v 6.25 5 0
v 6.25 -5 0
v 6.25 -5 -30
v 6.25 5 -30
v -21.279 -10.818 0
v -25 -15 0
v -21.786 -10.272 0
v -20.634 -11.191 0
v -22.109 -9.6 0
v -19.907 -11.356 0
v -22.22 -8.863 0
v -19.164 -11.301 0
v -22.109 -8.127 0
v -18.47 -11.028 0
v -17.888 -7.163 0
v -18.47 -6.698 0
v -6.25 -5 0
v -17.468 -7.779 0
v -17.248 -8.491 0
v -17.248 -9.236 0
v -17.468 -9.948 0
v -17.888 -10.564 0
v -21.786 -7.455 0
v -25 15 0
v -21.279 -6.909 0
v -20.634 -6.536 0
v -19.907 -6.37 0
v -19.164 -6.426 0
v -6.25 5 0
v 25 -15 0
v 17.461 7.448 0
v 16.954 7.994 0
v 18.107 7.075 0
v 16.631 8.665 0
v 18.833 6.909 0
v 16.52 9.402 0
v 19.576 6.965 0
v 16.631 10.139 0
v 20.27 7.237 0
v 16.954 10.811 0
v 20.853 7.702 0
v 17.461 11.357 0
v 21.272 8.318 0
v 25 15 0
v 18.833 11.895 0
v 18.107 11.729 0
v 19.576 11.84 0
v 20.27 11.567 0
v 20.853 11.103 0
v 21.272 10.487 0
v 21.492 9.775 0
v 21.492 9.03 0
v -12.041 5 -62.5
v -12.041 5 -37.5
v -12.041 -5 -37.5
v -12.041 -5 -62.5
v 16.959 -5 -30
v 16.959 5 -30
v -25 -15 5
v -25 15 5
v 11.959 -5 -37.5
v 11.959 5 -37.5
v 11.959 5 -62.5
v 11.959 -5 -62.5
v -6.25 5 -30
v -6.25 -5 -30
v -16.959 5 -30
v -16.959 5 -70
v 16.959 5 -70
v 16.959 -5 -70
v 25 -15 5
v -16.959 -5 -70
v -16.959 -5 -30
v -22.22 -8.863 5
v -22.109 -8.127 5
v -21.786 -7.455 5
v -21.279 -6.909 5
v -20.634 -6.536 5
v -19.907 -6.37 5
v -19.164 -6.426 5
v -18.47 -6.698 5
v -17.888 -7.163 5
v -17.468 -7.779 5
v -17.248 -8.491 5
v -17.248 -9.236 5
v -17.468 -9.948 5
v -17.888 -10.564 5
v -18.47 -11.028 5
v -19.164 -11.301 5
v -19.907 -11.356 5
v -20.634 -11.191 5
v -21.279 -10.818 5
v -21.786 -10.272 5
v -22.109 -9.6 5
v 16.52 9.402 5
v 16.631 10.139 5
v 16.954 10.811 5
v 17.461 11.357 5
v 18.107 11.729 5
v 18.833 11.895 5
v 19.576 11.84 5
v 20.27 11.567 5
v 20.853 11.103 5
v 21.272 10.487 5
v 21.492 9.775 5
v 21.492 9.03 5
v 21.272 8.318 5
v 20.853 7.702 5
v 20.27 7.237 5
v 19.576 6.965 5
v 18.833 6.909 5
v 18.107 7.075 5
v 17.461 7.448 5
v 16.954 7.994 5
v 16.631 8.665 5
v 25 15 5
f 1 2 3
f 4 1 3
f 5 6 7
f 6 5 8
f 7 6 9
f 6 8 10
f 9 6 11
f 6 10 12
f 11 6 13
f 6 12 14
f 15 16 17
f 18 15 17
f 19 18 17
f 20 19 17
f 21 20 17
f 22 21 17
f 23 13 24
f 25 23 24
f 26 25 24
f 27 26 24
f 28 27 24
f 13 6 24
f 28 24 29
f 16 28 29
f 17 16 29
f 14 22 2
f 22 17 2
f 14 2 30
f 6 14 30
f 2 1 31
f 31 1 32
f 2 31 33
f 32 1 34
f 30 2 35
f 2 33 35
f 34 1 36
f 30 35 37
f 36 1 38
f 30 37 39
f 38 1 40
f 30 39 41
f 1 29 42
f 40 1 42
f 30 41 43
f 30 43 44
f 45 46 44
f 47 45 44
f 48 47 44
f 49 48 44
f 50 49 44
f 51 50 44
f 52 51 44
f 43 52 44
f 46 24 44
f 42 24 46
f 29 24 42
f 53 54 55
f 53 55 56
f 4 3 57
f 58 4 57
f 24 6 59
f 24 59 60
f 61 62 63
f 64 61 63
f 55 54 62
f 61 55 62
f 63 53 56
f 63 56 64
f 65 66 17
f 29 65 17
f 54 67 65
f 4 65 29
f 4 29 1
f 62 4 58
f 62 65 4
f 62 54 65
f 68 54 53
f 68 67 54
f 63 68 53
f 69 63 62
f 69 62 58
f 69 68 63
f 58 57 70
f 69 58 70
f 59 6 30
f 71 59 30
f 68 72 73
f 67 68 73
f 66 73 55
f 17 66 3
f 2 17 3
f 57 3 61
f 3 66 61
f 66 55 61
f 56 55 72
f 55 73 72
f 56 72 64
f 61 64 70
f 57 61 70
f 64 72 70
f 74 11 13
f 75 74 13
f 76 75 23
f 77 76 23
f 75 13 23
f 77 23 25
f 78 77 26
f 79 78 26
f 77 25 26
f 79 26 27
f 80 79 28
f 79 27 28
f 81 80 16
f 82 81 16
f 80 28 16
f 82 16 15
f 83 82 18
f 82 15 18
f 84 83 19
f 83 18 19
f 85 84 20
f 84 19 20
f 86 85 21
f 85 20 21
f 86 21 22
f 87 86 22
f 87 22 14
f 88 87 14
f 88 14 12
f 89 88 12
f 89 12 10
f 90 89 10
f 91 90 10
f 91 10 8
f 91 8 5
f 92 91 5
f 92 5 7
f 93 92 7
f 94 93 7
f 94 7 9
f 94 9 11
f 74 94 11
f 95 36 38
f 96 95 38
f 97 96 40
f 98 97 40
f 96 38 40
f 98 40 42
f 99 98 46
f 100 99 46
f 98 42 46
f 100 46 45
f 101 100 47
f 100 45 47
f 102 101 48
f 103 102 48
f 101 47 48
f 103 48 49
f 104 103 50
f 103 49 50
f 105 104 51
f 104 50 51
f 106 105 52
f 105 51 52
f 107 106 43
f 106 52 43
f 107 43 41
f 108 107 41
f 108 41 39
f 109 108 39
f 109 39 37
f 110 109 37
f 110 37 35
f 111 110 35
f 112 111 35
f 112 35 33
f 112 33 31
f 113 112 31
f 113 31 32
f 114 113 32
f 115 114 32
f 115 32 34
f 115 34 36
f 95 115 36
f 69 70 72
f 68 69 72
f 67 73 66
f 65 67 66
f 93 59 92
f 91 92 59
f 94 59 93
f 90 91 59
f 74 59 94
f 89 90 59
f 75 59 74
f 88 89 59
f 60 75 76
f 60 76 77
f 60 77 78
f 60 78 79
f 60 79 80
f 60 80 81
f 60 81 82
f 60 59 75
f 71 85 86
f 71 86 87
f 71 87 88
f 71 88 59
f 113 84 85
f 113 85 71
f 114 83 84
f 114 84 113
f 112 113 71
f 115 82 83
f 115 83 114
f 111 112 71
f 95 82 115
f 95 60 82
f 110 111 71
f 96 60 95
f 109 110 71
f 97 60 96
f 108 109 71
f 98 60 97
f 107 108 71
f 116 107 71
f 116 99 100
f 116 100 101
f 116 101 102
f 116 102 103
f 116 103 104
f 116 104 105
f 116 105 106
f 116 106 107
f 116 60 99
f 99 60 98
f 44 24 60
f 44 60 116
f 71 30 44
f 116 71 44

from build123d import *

# Parameters (mm, degrees)
SKETCH1_W                = 50
SKETCH1_H                = 30
BOSS_EXTRUDE1_DEPTH      = 5
BOSS_EXTRUDE2_DEPTH      = 5
BOSS_EXTRUDE2_DEPTH_BACK = 5
SKETCH3_W                = 24
SKETCH3_H                = 25
CUT_EXTRUDE1_DEPTH       = 10
SKETCH4_R                = 2.5
CUT_EXTRUDE2_DEPTH       = 10
SKETCH5_R                = 2.5
CUT_EXTRUDE3_DEPTH       = 10


with BuildPart() as part:
    # Sketch1 → Boss-Extrude1 (new body)
    with BuildSketch(Plane.XY):
        Rectangle(SKETCH1_W, SKETCH1_H)
    extrude(amount=BOSS_EXTRUDE1_DEPTH)

    # Sketch2 → Boss-Extrude2 (add, two sides: drawn at the far end of the back side and taken through both)
    with BuildSketch(Plane(origin=(0, 0, 0), x_dir=(1, 0, 0), z_dir=(0, 1, 0)).offset(-BOSS_EXTRUDE2_DEPTH_BACK)):
        Polygon((-6.250199949, 30), (-6.250199949, 0), (6.250199949, 0), (6.250199949, 30), (16.958872349, 30), (16.958872349, 70), (-16.958872349, 70), (-16.958872349, 30), align=None)
    extrude(amount=BOSS_EXTRUDE2_DEPTH + BOSS_EXTRUDE2_DEPTH_BACK)

    # Sketch3 → Cut-Extrude1 (cut)
    with BuildSketch(Plane(origin=(0, 5, 0), x_dir=(1, 0, 0), z_dir=(0, 1, 0))):
        with Locations((-0.041127651, 50)):
            Rectangle(SKETCH3_W, SKETCH3_H)
    extrude(amount=-CUT_EXTRUDE1_DEPTH, mode=Mode.SUBTRACT)

    # Sketch4 → Cut-Extrude2 (cut)
    with BuildSketch(Plane(origin=(0, 0, 0), x_dir=(-1, 0, 0), z_dir=(0, 0, -1))):
        with Locations((-19.020005018, 9.402240441)):
            Circle(SKETCH4_R)
    extrude(amount=-CUT_EXTRUDE2_DEPTH, mode=Mode.SUBTRACT)

    # Sketch5 → Cut-Extrude3 (cut)
    with BuildSketch(Plane(origin=(0, 0, 0), x_dir=(-1, 0, 0), z_dir=(0, 0, -1))):
        with Locations((19.72045846, -8.8634301)):
            Circle(SKETCH5_R)
    extrude(amount=-CUT_EXTRUDE3_DEPTH, mode=Mode.SUBTRACT)


solid = part.part
